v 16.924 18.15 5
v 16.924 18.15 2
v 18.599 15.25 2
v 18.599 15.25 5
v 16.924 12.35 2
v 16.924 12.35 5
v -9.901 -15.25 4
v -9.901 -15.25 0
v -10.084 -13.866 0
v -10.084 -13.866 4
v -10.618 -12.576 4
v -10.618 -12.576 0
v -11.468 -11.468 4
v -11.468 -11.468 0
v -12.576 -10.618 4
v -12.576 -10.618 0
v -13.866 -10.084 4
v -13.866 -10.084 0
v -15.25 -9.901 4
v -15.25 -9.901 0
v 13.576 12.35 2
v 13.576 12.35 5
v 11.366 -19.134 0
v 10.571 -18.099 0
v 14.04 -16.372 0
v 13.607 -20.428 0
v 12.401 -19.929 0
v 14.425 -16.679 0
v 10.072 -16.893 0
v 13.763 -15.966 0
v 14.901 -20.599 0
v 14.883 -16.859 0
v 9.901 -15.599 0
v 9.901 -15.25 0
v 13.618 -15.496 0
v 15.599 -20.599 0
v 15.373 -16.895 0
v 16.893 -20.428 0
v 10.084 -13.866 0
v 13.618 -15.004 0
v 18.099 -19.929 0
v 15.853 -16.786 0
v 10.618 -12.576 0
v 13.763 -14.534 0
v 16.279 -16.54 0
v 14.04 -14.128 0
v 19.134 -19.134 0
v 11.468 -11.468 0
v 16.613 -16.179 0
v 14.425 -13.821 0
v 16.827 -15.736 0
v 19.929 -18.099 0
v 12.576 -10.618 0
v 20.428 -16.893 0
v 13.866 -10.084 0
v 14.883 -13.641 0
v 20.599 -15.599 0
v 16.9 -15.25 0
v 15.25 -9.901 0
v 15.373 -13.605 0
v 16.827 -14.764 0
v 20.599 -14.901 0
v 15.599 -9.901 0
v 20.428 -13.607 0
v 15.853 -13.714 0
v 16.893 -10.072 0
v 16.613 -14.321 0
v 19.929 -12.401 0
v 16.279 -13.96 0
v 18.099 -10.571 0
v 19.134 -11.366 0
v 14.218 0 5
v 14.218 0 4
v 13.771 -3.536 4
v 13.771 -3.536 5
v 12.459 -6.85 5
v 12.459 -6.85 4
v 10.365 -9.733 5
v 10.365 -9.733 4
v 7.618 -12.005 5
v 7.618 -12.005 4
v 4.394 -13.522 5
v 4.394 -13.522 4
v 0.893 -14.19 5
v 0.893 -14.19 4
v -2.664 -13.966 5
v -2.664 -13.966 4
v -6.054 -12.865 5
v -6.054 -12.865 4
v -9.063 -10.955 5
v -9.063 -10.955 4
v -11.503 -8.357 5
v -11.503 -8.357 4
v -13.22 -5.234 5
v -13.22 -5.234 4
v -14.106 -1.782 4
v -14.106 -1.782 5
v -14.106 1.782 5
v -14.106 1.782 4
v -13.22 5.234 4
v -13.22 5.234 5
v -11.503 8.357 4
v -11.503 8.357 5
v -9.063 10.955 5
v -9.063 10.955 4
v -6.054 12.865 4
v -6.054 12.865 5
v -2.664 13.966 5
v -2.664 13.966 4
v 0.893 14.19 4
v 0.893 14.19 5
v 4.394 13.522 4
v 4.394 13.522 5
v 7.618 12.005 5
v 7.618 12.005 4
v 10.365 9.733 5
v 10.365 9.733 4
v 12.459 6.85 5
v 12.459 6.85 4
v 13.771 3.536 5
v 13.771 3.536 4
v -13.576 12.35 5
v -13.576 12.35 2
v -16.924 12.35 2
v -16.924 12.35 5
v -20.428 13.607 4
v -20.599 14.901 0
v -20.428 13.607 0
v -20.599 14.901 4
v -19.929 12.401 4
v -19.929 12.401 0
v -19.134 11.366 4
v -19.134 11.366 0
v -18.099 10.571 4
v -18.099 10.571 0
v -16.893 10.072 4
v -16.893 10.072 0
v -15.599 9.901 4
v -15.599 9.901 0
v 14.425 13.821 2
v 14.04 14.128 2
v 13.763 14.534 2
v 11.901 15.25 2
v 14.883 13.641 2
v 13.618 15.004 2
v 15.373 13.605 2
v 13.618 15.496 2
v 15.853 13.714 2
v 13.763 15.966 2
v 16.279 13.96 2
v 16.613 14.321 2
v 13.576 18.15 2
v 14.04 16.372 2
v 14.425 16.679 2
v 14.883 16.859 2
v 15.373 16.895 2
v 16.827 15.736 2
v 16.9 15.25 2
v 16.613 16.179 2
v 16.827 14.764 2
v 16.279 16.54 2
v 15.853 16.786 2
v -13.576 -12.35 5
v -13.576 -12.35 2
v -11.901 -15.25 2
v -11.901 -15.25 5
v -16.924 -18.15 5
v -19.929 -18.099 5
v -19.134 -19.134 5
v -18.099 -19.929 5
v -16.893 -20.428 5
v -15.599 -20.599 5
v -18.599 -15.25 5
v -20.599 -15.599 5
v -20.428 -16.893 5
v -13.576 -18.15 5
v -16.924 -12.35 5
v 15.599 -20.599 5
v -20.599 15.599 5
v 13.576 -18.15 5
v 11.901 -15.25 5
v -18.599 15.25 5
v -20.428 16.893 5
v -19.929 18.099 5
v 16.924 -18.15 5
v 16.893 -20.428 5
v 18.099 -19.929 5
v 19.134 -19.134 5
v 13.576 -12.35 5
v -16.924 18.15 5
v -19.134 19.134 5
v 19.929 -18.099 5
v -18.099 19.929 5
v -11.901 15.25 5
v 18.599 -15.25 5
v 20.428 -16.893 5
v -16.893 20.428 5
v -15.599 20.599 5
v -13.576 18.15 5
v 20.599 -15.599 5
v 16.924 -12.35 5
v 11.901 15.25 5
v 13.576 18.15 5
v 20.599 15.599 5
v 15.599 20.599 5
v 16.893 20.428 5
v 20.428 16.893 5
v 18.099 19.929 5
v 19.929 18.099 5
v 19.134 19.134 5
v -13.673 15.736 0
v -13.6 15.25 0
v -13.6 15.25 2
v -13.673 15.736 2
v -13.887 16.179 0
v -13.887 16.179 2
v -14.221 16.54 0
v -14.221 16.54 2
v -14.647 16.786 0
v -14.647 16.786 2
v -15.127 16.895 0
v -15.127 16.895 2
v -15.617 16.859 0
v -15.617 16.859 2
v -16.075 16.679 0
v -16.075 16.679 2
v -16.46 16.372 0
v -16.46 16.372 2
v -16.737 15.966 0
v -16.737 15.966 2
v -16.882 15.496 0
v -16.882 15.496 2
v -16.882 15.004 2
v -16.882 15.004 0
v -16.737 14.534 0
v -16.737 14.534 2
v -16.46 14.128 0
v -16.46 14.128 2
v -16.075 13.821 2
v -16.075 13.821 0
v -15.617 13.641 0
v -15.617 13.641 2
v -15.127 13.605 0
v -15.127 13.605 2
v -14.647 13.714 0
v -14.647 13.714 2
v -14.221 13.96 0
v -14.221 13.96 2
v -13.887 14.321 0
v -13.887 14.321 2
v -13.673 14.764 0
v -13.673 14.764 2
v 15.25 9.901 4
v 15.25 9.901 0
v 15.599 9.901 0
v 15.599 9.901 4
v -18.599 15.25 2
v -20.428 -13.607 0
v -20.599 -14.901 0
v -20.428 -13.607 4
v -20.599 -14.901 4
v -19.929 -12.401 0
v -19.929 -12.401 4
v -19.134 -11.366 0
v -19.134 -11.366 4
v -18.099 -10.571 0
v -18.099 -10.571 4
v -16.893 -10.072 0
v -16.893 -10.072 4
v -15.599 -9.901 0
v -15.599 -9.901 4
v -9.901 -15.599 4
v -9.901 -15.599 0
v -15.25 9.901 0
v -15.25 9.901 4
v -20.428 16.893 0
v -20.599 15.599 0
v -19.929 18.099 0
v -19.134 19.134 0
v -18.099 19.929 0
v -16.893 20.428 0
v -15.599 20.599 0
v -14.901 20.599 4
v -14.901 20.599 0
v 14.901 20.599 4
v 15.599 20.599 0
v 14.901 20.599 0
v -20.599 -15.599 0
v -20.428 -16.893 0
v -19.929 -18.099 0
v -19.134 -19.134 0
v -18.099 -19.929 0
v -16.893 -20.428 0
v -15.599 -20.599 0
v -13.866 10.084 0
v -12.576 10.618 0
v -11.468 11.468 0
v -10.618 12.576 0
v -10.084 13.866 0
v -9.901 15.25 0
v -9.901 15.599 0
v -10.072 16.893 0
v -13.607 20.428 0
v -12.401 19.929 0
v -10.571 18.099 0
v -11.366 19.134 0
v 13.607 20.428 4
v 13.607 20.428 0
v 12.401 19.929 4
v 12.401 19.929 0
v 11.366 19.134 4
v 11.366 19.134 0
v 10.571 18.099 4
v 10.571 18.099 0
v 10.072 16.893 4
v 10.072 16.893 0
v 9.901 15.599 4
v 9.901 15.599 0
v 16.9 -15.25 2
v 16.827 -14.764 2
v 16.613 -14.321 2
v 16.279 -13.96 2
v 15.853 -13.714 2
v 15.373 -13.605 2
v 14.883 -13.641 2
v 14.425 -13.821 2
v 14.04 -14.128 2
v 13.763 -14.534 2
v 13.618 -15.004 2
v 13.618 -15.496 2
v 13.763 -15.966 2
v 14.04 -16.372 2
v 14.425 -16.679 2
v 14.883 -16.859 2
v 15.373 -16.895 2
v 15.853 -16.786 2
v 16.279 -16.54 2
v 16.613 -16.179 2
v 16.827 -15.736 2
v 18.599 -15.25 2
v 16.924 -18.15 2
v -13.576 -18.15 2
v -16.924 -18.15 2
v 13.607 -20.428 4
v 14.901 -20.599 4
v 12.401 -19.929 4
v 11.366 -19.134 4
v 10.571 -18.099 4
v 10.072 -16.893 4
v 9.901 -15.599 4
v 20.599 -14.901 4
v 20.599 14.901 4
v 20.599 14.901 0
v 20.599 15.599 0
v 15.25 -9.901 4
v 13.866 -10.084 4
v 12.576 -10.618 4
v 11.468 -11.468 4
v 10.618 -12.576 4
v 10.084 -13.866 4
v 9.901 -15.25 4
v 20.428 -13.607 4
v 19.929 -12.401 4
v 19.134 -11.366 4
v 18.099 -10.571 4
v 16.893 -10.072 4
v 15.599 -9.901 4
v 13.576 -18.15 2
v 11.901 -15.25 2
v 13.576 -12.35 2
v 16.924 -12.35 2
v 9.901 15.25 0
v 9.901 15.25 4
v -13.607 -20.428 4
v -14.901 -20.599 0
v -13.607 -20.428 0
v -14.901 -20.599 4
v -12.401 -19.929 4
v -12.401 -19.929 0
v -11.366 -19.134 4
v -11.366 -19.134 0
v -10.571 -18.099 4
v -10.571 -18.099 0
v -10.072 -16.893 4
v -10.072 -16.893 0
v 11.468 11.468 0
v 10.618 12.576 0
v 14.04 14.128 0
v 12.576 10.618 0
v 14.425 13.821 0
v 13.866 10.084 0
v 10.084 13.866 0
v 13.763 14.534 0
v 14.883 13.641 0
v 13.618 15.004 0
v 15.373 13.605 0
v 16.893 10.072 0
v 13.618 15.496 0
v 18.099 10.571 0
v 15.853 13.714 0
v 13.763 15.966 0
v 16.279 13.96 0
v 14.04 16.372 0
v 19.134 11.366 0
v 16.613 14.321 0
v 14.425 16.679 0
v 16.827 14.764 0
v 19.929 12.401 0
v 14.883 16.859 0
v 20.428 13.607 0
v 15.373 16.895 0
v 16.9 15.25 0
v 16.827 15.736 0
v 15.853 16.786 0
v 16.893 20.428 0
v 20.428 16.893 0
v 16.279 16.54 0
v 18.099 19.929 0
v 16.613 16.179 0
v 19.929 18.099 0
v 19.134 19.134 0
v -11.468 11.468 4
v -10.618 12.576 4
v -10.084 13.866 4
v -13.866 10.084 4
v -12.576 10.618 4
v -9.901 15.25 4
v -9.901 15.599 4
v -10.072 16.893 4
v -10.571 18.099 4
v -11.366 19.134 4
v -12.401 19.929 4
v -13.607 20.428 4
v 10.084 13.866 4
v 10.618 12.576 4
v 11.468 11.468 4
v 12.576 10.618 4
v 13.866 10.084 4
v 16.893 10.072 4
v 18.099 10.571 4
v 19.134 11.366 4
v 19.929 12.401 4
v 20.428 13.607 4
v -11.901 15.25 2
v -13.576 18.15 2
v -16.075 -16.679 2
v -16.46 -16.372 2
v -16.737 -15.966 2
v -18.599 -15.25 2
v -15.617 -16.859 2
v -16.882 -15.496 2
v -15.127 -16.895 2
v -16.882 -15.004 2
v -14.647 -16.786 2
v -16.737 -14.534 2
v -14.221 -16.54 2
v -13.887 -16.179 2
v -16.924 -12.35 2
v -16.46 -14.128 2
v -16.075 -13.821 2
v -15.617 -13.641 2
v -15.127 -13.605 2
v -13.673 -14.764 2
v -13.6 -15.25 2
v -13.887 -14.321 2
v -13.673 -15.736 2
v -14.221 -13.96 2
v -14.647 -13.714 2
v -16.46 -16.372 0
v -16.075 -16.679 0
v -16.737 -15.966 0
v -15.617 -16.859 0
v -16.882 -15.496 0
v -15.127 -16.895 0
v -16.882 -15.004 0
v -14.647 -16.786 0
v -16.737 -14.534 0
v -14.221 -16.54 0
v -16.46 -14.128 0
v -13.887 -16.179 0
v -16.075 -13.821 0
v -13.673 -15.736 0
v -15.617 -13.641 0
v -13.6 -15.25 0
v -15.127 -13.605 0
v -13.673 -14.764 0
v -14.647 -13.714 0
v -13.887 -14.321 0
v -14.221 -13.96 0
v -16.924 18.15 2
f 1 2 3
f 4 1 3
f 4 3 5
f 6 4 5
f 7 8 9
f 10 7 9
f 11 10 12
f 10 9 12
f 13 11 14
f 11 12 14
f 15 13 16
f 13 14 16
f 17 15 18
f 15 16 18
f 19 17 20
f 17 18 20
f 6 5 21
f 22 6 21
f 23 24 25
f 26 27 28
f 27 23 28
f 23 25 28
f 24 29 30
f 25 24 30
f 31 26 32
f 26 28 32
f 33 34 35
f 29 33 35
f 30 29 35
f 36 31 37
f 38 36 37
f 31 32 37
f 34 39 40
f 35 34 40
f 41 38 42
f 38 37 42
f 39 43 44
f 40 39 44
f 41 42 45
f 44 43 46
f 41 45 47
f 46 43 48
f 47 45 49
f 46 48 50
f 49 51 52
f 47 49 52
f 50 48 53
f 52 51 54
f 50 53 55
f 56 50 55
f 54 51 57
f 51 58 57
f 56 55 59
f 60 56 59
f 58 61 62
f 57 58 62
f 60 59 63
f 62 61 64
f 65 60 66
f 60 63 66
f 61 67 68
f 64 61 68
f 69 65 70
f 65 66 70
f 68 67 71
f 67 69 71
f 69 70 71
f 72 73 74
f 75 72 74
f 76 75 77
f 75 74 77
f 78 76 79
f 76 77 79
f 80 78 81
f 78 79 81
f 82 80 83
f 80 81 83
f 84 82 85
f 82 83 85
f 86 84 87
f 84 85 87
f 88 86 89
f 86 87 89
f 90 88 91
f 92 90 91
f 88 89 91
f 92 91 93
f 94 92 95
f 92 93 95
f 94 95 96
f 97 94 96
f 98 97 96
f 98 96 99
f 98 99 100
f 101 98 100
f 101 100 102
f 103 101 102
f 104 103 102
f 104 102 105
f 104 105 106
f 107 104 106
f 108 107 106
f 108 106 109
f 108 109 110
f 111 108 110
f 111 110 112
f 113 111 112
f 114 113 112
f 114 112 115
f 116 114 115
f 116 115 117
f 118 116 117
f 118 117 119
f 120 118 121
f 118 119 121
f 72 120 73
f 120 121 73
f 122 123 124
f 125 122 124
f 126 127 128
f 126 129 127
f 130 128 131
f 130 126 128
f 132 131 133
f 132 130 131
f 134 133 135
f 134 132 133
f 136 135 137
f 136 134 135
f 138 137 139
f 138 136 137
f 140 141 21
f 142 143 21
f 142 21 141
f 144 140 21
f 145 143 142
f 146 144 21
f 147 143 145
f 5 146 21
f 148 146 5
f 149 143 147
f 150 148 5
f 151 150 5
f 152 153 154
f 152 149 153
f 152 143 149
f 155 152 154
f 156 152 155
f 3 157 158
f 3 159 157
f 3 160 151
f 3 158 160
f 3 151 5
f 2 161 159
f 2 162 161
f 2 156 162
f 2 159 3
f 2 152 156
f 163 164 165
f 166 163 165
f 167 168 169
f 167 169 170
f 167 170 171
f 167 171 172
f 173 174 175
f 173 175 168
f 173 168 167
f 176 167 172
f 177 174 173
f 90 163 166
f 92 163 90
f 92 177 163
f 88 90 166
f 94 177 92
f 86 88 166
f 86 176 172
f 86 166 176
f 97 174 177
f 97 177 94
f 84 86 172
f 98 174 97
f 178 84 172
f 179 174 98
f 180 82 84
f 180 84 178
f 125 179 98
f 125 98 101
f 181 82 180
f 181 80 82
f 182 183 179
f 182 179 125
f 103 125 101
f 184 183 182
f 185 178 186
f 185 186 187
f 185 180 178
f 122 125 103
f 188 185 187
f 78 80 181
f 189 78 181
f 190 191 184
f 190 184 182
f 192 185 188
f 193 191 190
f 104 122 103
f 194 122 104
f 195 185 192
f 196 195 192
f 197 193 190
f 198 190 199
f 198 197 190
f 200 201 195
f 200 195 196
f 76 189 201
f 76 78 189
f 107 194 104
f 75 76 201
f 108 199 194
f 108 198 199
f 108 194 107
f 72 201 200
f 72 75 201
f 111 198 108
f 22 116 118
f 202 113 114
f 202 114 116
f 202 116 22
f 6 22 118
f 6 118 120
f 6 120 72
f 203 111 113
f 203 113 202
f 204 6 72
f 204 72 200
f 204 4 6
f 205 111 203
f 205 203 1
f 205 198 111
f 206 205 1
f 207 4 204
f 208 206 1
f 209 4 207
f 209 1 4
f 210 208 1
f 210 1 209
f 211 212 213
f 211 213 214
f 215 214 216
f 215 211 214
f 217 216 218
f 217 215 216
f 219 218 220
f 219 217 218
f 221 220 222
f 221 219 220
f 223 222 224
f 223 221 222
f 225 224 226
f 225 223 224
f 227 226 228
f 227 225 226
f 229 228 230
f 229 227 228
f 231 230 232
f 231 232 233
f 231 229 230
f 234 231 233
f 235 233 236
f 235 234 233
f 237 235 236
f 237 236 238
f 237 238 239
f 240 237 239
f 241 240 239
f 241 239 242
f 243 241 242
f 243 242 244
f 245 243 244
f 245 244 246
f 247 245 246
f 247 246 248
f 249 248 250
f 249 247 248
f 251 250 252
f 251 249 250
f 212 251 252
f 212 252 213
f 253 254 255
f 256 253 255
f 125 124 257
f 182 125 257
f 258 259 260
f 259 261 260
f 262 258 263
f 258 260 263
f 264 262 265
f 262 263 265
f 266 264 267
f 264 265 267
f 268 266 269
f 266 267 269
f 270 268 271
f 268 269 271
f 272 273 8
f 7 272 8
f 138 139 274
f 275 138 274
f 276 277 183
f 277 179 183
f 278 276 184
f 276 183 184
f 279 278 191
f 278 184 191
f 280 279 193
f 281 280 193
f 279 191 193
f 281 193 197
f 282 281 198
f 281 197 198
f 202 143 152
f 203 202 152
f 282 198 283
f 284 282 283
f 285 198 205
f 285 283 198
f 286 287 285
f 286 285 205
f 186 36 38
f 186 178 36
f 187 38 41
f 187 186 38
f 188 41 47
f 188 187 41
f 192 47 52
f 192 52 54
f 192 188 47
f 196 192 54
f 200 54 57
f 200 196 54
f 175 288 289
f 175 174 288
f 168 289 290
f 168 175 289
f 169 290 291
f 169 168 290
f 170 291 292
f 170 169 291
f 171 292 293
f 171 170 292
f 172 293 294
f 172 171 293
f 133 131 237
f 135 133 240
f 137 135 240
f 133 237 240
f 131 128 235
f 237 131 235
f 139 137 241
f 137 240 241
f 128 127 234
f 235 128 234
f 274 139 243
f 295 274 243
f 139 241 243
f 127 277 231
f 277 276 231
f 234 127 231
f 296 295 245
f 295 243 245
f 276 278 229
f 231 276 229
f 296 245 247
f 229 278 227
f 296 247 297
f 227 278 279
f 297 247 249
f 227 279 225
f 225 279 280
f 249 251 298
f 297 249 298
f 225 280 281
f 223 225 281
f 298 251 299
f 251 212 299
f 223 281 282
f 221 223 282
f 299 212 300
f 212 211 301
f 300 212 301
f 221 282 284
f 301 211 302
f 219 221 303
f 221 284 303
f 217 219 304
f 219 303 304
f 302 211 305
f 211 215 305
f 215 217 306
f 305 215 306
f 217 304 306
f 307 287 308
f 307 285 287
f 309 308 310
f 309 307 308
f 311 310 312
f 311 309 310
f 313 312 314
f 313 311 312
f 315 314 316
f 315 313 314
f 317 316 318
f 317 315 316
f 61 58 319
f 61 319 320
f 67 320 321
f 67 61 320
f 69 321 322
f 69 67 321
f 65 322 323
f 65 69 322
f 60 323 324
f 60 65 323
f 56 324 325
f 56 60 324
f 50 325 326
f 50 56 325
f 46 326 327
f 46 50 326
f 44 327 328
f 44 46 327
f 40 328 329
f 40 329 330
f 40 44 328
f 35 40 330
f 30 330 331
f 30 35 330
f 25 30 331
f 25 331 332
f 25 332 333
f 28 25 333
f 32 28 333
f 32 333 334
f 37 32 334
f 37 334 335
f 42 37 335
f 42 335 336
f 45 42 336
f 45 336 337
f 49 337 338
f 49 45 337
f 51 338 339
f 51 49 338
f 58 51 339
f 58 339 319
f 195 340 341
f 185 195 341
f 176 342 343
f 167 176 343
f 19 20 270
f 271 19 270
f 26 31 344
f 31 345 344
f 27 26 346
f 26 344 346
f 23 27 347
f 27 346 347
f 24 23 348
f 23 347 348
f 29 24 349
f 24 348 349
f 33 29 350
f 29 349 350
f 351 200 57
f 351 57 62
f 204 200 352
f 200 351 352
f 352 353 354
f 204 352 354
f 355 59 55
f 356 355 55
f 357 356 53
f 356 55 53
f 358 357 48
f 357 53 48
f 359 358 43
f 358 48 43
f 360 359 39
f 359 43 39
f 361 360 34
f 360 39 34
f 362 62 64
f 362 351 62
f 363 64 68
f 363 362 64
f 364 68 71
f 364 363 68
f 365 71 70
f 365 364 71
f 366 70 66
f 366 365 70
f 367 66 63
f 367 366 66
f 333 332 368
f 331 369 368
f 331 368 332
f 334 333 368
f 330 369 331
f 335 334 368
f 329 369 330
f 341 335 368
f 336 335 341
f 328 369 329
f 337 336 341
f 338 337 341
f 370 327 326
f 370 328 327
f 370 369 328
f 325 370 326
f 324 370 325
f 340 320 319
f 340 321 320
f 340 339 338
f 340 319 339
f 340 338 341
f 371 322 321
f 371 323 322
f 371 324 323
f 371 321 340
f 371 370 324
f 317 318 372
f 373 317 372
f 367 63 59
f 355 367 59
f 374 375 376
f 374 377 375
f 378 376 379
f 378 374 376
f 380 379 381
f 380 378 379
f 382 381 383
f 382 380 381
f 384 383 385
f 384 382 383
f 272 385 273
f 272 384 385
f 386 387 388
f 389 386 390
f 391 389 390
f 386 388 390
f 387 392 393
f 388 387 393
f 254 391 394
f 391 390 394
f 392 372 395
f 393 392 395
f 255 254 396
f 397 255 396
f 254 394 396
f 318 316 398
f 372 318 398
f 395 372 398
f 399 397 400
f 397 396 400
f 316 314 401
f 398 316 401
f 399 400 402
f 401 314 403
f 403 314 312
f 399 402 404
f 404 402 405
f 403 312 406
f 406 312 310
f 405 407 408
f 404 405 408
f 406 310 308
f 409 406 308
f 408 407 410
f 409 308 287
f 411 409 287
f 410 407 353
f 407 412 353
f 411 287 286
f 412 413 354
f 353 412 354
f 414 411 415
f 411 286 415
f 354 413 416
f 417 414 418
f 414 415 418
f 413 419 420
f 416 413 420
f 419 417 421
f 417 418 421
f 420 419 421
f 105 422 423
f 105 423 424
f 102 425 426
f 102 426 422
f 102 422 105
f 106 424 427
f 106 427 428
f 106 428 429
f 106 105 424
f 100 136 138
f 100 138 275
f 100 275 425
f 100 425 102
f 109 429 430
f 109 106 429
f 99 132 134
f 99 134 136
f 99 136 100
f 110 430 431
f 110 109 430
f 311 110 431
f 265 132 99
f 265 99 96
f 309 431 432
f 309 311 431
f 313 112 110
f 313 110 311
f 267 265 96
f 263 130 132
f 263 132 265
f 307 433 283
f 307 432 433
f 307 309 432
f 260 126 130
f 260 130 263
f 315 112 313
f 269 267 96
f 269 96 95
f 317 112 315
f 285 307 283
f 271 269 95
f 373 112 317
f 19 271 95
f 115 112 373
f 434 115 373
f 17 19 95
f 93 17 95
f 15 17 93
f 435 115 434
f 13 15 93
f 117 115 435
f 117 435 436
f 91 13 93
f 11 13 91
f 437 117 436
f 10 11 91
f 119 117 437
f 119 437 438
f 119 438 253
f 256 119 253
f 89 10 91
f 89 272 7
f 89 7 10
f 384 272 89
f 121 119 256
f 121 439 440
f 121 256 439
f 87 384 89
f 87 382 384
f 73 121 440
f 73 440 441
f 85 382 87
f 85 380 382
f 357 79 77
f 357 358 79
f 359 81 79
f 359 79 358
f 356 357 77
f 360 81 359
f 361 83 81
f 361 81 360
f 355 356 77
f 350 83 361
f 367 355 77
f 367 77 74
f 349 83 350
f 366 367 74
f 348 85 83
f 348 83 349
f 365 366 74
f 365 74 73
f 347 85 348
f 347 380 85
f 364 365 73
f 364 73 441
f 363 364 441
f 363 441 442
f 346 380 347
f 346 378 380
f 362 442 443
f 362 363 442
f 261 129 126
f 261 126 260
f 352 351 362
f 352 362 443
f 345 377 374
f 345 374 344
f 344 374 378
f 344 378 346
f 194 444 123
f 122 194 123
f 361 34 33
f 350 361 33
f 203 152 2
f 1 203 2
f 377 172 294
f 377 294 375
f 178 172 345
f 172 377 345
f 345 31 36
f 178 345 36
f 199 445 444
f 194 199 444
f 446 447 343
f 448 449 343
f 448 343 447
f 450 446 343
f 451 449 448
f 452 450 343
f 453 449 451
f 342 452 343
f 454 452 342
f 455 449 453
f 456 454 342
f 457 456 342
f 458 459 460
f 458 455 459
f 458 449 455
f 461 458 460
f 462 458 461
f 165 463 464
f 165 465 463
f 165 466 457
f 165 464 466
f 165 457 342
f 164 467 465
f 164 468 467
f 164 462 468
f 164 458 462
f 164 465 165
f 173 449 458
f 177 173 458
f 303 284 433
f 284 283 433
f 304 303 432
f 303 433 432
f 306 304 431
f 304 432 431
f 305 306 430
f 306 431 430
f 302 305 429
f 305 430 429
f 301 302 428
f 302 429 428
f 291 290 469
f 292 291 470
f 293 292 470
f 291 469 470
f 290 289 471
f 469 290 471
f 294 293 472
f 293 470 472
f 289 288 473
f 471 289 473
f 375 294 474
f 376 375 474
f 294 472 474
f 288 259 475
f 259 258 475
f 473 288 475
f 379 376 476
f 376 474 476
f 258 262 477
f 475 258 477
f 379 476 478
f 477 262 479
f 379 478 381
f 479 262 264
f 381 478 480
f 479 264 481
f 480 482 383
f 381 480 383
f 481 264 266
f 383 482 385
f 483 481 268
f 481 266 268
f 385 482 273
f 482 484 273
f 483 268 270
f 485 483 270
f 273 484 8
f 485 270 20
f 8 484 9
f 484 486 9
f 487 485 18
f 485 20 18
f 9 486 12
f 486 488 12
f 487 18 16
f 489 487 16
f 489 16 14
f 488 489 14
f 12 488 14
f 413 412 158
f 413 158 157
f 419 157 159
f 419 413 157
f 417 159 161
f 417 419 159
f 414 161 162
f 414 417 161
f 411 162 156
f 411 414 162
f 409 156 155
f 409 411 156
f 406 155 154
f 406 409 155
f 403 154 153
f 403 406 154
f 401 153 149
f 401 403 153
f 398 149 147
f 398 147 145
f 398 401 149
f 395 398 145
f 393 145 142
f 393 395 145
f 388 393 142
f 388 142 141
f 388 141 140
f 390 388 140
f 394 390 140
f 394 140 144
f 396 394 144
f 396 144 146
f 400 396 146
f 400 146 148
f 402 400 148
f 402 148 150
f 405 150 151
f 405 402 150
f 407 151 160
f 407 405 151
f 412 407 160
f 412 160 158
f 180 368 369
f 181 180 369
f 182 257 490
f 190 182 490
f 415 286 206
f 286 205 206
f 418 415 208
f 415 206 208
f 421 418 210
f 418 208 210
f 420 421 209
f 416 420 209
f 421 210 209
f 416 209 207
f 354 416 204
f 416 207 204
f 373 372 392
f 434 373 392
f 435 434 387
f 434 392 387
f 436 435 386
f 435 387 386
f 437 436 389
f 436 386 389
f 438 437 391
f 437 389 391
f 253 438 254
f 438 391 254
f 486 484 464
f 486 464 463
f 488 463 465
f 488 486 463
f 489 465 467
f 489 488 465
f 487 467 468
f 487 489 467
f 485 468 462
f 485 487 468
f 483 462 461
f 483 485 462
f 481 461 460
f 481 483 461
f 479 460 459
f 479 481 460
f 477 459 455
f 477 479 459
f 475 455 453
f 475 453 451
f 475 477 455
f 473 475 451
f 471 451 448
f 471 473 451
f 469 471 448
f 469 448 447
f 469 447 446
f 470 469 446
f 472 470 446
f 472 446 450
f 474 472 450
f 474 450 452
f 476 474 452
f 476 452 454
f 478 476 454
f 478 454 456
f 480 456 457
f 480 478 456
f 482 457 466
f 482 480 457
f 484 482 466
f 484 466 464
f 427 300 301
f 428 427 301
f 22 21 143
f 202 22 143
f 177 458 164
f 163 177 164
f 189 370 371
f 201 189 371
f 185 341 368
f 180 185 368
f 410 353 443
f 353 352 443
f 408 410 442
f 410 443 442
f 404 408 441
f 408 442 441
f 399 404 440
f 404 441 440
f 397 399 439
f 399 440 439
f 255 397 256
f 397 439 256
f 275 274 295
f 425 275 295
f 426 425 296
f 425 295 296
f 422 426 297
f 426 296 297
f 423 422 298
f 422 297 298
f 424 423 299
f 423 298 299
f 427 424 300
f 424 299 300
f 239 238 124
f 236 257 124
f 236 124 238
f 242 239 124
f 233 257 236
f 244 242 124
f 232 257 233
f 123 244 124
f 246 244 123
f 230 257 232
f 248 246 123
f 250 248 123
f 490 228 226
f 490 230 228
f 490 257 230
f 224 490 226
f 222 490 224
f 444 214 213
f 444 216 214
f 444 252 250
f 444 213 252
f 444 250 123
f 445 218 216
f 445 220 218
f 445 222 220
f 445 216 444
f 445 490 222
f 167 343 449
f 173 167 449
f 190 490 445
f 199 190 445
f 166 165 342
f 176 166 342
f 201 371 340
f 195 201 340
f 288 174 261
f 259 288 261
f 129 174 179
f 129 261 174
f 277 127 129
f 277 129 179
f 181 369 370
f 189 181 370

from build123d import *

# Parameters (mm, degrees)
F0_W     = 41.1972631226
F0_H     = 41.1972631226
F1_DEPTH = 5
F0_R     = 1.65
F2_DEPTH = 2
F4_DEPTH = 4
F5_R     = 14.2181252649
F6_DEPTH = 1.001
F7_R     = 5


with BuildPart() as f1:
    # F0 (on Top) → F1 (new body)
    with BuildSketch(Plane.XY):
        Rectangle(F0_W, F0_H)
        Polygon((-16.9243157806, -12.35), (-13.5756842194, -12.35), (-11.9013684387, -15.25), (-13.5756842194, -18.15), (-16.9243157806, -18.15), (-18.5986315613, -15.25), align=None, mode=Mode.SUBTRACT)
        Polygon((13.5756842194, -12.35), (16.9243157806, -12.35), (18.5986315613, -15.25), (16.9243157806, -18.15), (13.5756842194, -18.15), (11.9013684387, -15.25), align=None, mode=Mode.SUBTRACT)
        Polygon((-18.5986315613, 15.25), (-16.9243157806, 18.15), (-13.5756842194, 18.15), (-11.9013684387, 15.25), (-13.5756842194, 12.35), (-16.9243157806, 12.35), align=None, mode=Mode.SUBTRACT)
        Polygon((13.5756842194, 18.15), (16.9243157806, 18.15), (18.5986315613, 15.25), (16.9243157806, 12.35), (13.5756842194, 12.35), (11.9013684387, 15.25), align=None, mode=Mode.SUBTRACT)
    extrude(amount=F1_DEPTH)

    # F0 (on Top) → F2 (join)
    with BuildSketch(Plane.XY):
        Polygon((-13.5756842194, 18.15), (-16.9243157806, 18.15), (-18.5986315613, 15.25), (-16.9243157806, 12.35), (-13.5756842194, 12.35), (-11.9013684387, 15.25), align=None)
        with Locations((-15.25, 15.25)):
            Circle(F0_R, mode=Mode.SUBTRACT)
        Polygon((18.5986315613, 15.25), (16.9243157806, 18.15), (13.5756842194, 18.15), (11.9013684387, 15.25), (13.5756842194, 12.35), (16.9243157806, 12.35), align=None)
        with Locations((15.25, 15.25)):
            Circle(F0_R, mode=Mode.SUBTRACT)
        Polygon((18.5986315613, -15.25), (16.9243157806, -12.35), (13.5756842194, -12.35), (11.9013684387, -15.25), (13.5756842194, -18.15), (16.9243157806, -18.15), align=None)
        with Locations((15.25, -15.25)):
            Circle(F0_R, mode=Mode.SUBTRACT)
        Polygon((-11.9013684387, -15.25), (-13.5756842194, -12.35), (-16.9243157806, -12.35), (-18.5986315613, -15.25), (-16.9243157806, -18.15), (-13.5756842194, -18.15), align=None)
        with Locations((-15.25, -15.25)):
            Circle(F0_R, mode=Mode.SUBTRACT)
    extrude(amount=F2_DEPTH)

    # F3 (on face) → F4 (cut)
    with BuildSketch(Plane(origin=(0, 0, 0), x_dir=(1, 0, 0), z_dir=(0, 0, -1))):
        with BuildLine():
            Line((-20.5986315613, 9.9013684387), (-20.5986315613, -9.9013684387))
            Line((-20.5986315613, -9.9013684387), (-15.25, -9.9013684387))
            ThreePointArc((-15.25, -9.9013684387), (-11.4679463529, -11.4679463529), (-9.9013684387, -15.25))
            Line((-9.9013684387, -15.25), (-9.9013684387, -20.5986315613))
            Line((-9.9013684387, -20.5986315613), (9.9013684387, -20.5986315613))
            Line((9.9013684387, -20.5986315613), (9.9013684387, -15.25))
            ThreePointArc((9.9013684387, -15.25), (11.4679463529, -11.4679463529), (15.25, -9.9013684387))
            Line((15.25, -9.9013684387), (20.5986315613, -9.9013684387))
            Line((20.5986315613, -9.9013684387), (20.5986315613, 9.9013684387))
            Line((20.5986315613, 9.9013684387), (15.25, 9.9013684387))
            ThreePointArc((15.25, 9.9013684387), (11.4679463529, 11.4679463529), (9.9013684387, 15.25))
            Line((9.9013684387, 15.25), (9.9013684387, 20.5986315613))
            Line((9.9013684387, 20.5986315613), (-9.9013684387, 20.5986315613))
            Line((-9.9013684387, 20.5986315613), (-9.9013684387, 15.25))
            ThreePointArc((-9.9013684387, 15.25), (-11.4679463529, 11.4679463529), (-15.25, 9.9013684387))
            Line((-15.25, 9.9013684387), (-20.5986315613, 9.9013684387))
        make_face()
    extrude(amount=-F4_DEPTH, mode=Mode.SUBTRACT)

    # F5 (on face) → F6 (cut, through all)
    with BuildSketch(Plane(origin=(0, 0, 4), x_dir=(1, 0, 0), z_dir=(0, 0, -1))):
        Circle(F5_R)
    extrude(amount=-F6_DEPTH, mode=Mode.SUBTRACT)

    # F7
    f7_edges = [f1.edges().sort_by_distance(p)[0] for p in [
        (-20.598632, 20.598632, 2.5),
        (20.598632, 20.598632, 2.5),
        (20.598632, -20.598632, 2.5),
        (-20.598632, -20.598632, 2.5),
        (-20.598632, -9.901368, 2),
        (-9.901368, -20.598632, 2),
        (-20.598632, 9.901368, 2),
        (-9.901368, 20.598632, 2),
        (9.901368, 20.598632, 2),
        (20.598632, 9.901368, 2),
        (20.598632, -9.901368, 2),
        (9.901368, -20.598632, 2),
    ]]
    fillet(f7_edges, radius=F7_R)


solid = f1.part
